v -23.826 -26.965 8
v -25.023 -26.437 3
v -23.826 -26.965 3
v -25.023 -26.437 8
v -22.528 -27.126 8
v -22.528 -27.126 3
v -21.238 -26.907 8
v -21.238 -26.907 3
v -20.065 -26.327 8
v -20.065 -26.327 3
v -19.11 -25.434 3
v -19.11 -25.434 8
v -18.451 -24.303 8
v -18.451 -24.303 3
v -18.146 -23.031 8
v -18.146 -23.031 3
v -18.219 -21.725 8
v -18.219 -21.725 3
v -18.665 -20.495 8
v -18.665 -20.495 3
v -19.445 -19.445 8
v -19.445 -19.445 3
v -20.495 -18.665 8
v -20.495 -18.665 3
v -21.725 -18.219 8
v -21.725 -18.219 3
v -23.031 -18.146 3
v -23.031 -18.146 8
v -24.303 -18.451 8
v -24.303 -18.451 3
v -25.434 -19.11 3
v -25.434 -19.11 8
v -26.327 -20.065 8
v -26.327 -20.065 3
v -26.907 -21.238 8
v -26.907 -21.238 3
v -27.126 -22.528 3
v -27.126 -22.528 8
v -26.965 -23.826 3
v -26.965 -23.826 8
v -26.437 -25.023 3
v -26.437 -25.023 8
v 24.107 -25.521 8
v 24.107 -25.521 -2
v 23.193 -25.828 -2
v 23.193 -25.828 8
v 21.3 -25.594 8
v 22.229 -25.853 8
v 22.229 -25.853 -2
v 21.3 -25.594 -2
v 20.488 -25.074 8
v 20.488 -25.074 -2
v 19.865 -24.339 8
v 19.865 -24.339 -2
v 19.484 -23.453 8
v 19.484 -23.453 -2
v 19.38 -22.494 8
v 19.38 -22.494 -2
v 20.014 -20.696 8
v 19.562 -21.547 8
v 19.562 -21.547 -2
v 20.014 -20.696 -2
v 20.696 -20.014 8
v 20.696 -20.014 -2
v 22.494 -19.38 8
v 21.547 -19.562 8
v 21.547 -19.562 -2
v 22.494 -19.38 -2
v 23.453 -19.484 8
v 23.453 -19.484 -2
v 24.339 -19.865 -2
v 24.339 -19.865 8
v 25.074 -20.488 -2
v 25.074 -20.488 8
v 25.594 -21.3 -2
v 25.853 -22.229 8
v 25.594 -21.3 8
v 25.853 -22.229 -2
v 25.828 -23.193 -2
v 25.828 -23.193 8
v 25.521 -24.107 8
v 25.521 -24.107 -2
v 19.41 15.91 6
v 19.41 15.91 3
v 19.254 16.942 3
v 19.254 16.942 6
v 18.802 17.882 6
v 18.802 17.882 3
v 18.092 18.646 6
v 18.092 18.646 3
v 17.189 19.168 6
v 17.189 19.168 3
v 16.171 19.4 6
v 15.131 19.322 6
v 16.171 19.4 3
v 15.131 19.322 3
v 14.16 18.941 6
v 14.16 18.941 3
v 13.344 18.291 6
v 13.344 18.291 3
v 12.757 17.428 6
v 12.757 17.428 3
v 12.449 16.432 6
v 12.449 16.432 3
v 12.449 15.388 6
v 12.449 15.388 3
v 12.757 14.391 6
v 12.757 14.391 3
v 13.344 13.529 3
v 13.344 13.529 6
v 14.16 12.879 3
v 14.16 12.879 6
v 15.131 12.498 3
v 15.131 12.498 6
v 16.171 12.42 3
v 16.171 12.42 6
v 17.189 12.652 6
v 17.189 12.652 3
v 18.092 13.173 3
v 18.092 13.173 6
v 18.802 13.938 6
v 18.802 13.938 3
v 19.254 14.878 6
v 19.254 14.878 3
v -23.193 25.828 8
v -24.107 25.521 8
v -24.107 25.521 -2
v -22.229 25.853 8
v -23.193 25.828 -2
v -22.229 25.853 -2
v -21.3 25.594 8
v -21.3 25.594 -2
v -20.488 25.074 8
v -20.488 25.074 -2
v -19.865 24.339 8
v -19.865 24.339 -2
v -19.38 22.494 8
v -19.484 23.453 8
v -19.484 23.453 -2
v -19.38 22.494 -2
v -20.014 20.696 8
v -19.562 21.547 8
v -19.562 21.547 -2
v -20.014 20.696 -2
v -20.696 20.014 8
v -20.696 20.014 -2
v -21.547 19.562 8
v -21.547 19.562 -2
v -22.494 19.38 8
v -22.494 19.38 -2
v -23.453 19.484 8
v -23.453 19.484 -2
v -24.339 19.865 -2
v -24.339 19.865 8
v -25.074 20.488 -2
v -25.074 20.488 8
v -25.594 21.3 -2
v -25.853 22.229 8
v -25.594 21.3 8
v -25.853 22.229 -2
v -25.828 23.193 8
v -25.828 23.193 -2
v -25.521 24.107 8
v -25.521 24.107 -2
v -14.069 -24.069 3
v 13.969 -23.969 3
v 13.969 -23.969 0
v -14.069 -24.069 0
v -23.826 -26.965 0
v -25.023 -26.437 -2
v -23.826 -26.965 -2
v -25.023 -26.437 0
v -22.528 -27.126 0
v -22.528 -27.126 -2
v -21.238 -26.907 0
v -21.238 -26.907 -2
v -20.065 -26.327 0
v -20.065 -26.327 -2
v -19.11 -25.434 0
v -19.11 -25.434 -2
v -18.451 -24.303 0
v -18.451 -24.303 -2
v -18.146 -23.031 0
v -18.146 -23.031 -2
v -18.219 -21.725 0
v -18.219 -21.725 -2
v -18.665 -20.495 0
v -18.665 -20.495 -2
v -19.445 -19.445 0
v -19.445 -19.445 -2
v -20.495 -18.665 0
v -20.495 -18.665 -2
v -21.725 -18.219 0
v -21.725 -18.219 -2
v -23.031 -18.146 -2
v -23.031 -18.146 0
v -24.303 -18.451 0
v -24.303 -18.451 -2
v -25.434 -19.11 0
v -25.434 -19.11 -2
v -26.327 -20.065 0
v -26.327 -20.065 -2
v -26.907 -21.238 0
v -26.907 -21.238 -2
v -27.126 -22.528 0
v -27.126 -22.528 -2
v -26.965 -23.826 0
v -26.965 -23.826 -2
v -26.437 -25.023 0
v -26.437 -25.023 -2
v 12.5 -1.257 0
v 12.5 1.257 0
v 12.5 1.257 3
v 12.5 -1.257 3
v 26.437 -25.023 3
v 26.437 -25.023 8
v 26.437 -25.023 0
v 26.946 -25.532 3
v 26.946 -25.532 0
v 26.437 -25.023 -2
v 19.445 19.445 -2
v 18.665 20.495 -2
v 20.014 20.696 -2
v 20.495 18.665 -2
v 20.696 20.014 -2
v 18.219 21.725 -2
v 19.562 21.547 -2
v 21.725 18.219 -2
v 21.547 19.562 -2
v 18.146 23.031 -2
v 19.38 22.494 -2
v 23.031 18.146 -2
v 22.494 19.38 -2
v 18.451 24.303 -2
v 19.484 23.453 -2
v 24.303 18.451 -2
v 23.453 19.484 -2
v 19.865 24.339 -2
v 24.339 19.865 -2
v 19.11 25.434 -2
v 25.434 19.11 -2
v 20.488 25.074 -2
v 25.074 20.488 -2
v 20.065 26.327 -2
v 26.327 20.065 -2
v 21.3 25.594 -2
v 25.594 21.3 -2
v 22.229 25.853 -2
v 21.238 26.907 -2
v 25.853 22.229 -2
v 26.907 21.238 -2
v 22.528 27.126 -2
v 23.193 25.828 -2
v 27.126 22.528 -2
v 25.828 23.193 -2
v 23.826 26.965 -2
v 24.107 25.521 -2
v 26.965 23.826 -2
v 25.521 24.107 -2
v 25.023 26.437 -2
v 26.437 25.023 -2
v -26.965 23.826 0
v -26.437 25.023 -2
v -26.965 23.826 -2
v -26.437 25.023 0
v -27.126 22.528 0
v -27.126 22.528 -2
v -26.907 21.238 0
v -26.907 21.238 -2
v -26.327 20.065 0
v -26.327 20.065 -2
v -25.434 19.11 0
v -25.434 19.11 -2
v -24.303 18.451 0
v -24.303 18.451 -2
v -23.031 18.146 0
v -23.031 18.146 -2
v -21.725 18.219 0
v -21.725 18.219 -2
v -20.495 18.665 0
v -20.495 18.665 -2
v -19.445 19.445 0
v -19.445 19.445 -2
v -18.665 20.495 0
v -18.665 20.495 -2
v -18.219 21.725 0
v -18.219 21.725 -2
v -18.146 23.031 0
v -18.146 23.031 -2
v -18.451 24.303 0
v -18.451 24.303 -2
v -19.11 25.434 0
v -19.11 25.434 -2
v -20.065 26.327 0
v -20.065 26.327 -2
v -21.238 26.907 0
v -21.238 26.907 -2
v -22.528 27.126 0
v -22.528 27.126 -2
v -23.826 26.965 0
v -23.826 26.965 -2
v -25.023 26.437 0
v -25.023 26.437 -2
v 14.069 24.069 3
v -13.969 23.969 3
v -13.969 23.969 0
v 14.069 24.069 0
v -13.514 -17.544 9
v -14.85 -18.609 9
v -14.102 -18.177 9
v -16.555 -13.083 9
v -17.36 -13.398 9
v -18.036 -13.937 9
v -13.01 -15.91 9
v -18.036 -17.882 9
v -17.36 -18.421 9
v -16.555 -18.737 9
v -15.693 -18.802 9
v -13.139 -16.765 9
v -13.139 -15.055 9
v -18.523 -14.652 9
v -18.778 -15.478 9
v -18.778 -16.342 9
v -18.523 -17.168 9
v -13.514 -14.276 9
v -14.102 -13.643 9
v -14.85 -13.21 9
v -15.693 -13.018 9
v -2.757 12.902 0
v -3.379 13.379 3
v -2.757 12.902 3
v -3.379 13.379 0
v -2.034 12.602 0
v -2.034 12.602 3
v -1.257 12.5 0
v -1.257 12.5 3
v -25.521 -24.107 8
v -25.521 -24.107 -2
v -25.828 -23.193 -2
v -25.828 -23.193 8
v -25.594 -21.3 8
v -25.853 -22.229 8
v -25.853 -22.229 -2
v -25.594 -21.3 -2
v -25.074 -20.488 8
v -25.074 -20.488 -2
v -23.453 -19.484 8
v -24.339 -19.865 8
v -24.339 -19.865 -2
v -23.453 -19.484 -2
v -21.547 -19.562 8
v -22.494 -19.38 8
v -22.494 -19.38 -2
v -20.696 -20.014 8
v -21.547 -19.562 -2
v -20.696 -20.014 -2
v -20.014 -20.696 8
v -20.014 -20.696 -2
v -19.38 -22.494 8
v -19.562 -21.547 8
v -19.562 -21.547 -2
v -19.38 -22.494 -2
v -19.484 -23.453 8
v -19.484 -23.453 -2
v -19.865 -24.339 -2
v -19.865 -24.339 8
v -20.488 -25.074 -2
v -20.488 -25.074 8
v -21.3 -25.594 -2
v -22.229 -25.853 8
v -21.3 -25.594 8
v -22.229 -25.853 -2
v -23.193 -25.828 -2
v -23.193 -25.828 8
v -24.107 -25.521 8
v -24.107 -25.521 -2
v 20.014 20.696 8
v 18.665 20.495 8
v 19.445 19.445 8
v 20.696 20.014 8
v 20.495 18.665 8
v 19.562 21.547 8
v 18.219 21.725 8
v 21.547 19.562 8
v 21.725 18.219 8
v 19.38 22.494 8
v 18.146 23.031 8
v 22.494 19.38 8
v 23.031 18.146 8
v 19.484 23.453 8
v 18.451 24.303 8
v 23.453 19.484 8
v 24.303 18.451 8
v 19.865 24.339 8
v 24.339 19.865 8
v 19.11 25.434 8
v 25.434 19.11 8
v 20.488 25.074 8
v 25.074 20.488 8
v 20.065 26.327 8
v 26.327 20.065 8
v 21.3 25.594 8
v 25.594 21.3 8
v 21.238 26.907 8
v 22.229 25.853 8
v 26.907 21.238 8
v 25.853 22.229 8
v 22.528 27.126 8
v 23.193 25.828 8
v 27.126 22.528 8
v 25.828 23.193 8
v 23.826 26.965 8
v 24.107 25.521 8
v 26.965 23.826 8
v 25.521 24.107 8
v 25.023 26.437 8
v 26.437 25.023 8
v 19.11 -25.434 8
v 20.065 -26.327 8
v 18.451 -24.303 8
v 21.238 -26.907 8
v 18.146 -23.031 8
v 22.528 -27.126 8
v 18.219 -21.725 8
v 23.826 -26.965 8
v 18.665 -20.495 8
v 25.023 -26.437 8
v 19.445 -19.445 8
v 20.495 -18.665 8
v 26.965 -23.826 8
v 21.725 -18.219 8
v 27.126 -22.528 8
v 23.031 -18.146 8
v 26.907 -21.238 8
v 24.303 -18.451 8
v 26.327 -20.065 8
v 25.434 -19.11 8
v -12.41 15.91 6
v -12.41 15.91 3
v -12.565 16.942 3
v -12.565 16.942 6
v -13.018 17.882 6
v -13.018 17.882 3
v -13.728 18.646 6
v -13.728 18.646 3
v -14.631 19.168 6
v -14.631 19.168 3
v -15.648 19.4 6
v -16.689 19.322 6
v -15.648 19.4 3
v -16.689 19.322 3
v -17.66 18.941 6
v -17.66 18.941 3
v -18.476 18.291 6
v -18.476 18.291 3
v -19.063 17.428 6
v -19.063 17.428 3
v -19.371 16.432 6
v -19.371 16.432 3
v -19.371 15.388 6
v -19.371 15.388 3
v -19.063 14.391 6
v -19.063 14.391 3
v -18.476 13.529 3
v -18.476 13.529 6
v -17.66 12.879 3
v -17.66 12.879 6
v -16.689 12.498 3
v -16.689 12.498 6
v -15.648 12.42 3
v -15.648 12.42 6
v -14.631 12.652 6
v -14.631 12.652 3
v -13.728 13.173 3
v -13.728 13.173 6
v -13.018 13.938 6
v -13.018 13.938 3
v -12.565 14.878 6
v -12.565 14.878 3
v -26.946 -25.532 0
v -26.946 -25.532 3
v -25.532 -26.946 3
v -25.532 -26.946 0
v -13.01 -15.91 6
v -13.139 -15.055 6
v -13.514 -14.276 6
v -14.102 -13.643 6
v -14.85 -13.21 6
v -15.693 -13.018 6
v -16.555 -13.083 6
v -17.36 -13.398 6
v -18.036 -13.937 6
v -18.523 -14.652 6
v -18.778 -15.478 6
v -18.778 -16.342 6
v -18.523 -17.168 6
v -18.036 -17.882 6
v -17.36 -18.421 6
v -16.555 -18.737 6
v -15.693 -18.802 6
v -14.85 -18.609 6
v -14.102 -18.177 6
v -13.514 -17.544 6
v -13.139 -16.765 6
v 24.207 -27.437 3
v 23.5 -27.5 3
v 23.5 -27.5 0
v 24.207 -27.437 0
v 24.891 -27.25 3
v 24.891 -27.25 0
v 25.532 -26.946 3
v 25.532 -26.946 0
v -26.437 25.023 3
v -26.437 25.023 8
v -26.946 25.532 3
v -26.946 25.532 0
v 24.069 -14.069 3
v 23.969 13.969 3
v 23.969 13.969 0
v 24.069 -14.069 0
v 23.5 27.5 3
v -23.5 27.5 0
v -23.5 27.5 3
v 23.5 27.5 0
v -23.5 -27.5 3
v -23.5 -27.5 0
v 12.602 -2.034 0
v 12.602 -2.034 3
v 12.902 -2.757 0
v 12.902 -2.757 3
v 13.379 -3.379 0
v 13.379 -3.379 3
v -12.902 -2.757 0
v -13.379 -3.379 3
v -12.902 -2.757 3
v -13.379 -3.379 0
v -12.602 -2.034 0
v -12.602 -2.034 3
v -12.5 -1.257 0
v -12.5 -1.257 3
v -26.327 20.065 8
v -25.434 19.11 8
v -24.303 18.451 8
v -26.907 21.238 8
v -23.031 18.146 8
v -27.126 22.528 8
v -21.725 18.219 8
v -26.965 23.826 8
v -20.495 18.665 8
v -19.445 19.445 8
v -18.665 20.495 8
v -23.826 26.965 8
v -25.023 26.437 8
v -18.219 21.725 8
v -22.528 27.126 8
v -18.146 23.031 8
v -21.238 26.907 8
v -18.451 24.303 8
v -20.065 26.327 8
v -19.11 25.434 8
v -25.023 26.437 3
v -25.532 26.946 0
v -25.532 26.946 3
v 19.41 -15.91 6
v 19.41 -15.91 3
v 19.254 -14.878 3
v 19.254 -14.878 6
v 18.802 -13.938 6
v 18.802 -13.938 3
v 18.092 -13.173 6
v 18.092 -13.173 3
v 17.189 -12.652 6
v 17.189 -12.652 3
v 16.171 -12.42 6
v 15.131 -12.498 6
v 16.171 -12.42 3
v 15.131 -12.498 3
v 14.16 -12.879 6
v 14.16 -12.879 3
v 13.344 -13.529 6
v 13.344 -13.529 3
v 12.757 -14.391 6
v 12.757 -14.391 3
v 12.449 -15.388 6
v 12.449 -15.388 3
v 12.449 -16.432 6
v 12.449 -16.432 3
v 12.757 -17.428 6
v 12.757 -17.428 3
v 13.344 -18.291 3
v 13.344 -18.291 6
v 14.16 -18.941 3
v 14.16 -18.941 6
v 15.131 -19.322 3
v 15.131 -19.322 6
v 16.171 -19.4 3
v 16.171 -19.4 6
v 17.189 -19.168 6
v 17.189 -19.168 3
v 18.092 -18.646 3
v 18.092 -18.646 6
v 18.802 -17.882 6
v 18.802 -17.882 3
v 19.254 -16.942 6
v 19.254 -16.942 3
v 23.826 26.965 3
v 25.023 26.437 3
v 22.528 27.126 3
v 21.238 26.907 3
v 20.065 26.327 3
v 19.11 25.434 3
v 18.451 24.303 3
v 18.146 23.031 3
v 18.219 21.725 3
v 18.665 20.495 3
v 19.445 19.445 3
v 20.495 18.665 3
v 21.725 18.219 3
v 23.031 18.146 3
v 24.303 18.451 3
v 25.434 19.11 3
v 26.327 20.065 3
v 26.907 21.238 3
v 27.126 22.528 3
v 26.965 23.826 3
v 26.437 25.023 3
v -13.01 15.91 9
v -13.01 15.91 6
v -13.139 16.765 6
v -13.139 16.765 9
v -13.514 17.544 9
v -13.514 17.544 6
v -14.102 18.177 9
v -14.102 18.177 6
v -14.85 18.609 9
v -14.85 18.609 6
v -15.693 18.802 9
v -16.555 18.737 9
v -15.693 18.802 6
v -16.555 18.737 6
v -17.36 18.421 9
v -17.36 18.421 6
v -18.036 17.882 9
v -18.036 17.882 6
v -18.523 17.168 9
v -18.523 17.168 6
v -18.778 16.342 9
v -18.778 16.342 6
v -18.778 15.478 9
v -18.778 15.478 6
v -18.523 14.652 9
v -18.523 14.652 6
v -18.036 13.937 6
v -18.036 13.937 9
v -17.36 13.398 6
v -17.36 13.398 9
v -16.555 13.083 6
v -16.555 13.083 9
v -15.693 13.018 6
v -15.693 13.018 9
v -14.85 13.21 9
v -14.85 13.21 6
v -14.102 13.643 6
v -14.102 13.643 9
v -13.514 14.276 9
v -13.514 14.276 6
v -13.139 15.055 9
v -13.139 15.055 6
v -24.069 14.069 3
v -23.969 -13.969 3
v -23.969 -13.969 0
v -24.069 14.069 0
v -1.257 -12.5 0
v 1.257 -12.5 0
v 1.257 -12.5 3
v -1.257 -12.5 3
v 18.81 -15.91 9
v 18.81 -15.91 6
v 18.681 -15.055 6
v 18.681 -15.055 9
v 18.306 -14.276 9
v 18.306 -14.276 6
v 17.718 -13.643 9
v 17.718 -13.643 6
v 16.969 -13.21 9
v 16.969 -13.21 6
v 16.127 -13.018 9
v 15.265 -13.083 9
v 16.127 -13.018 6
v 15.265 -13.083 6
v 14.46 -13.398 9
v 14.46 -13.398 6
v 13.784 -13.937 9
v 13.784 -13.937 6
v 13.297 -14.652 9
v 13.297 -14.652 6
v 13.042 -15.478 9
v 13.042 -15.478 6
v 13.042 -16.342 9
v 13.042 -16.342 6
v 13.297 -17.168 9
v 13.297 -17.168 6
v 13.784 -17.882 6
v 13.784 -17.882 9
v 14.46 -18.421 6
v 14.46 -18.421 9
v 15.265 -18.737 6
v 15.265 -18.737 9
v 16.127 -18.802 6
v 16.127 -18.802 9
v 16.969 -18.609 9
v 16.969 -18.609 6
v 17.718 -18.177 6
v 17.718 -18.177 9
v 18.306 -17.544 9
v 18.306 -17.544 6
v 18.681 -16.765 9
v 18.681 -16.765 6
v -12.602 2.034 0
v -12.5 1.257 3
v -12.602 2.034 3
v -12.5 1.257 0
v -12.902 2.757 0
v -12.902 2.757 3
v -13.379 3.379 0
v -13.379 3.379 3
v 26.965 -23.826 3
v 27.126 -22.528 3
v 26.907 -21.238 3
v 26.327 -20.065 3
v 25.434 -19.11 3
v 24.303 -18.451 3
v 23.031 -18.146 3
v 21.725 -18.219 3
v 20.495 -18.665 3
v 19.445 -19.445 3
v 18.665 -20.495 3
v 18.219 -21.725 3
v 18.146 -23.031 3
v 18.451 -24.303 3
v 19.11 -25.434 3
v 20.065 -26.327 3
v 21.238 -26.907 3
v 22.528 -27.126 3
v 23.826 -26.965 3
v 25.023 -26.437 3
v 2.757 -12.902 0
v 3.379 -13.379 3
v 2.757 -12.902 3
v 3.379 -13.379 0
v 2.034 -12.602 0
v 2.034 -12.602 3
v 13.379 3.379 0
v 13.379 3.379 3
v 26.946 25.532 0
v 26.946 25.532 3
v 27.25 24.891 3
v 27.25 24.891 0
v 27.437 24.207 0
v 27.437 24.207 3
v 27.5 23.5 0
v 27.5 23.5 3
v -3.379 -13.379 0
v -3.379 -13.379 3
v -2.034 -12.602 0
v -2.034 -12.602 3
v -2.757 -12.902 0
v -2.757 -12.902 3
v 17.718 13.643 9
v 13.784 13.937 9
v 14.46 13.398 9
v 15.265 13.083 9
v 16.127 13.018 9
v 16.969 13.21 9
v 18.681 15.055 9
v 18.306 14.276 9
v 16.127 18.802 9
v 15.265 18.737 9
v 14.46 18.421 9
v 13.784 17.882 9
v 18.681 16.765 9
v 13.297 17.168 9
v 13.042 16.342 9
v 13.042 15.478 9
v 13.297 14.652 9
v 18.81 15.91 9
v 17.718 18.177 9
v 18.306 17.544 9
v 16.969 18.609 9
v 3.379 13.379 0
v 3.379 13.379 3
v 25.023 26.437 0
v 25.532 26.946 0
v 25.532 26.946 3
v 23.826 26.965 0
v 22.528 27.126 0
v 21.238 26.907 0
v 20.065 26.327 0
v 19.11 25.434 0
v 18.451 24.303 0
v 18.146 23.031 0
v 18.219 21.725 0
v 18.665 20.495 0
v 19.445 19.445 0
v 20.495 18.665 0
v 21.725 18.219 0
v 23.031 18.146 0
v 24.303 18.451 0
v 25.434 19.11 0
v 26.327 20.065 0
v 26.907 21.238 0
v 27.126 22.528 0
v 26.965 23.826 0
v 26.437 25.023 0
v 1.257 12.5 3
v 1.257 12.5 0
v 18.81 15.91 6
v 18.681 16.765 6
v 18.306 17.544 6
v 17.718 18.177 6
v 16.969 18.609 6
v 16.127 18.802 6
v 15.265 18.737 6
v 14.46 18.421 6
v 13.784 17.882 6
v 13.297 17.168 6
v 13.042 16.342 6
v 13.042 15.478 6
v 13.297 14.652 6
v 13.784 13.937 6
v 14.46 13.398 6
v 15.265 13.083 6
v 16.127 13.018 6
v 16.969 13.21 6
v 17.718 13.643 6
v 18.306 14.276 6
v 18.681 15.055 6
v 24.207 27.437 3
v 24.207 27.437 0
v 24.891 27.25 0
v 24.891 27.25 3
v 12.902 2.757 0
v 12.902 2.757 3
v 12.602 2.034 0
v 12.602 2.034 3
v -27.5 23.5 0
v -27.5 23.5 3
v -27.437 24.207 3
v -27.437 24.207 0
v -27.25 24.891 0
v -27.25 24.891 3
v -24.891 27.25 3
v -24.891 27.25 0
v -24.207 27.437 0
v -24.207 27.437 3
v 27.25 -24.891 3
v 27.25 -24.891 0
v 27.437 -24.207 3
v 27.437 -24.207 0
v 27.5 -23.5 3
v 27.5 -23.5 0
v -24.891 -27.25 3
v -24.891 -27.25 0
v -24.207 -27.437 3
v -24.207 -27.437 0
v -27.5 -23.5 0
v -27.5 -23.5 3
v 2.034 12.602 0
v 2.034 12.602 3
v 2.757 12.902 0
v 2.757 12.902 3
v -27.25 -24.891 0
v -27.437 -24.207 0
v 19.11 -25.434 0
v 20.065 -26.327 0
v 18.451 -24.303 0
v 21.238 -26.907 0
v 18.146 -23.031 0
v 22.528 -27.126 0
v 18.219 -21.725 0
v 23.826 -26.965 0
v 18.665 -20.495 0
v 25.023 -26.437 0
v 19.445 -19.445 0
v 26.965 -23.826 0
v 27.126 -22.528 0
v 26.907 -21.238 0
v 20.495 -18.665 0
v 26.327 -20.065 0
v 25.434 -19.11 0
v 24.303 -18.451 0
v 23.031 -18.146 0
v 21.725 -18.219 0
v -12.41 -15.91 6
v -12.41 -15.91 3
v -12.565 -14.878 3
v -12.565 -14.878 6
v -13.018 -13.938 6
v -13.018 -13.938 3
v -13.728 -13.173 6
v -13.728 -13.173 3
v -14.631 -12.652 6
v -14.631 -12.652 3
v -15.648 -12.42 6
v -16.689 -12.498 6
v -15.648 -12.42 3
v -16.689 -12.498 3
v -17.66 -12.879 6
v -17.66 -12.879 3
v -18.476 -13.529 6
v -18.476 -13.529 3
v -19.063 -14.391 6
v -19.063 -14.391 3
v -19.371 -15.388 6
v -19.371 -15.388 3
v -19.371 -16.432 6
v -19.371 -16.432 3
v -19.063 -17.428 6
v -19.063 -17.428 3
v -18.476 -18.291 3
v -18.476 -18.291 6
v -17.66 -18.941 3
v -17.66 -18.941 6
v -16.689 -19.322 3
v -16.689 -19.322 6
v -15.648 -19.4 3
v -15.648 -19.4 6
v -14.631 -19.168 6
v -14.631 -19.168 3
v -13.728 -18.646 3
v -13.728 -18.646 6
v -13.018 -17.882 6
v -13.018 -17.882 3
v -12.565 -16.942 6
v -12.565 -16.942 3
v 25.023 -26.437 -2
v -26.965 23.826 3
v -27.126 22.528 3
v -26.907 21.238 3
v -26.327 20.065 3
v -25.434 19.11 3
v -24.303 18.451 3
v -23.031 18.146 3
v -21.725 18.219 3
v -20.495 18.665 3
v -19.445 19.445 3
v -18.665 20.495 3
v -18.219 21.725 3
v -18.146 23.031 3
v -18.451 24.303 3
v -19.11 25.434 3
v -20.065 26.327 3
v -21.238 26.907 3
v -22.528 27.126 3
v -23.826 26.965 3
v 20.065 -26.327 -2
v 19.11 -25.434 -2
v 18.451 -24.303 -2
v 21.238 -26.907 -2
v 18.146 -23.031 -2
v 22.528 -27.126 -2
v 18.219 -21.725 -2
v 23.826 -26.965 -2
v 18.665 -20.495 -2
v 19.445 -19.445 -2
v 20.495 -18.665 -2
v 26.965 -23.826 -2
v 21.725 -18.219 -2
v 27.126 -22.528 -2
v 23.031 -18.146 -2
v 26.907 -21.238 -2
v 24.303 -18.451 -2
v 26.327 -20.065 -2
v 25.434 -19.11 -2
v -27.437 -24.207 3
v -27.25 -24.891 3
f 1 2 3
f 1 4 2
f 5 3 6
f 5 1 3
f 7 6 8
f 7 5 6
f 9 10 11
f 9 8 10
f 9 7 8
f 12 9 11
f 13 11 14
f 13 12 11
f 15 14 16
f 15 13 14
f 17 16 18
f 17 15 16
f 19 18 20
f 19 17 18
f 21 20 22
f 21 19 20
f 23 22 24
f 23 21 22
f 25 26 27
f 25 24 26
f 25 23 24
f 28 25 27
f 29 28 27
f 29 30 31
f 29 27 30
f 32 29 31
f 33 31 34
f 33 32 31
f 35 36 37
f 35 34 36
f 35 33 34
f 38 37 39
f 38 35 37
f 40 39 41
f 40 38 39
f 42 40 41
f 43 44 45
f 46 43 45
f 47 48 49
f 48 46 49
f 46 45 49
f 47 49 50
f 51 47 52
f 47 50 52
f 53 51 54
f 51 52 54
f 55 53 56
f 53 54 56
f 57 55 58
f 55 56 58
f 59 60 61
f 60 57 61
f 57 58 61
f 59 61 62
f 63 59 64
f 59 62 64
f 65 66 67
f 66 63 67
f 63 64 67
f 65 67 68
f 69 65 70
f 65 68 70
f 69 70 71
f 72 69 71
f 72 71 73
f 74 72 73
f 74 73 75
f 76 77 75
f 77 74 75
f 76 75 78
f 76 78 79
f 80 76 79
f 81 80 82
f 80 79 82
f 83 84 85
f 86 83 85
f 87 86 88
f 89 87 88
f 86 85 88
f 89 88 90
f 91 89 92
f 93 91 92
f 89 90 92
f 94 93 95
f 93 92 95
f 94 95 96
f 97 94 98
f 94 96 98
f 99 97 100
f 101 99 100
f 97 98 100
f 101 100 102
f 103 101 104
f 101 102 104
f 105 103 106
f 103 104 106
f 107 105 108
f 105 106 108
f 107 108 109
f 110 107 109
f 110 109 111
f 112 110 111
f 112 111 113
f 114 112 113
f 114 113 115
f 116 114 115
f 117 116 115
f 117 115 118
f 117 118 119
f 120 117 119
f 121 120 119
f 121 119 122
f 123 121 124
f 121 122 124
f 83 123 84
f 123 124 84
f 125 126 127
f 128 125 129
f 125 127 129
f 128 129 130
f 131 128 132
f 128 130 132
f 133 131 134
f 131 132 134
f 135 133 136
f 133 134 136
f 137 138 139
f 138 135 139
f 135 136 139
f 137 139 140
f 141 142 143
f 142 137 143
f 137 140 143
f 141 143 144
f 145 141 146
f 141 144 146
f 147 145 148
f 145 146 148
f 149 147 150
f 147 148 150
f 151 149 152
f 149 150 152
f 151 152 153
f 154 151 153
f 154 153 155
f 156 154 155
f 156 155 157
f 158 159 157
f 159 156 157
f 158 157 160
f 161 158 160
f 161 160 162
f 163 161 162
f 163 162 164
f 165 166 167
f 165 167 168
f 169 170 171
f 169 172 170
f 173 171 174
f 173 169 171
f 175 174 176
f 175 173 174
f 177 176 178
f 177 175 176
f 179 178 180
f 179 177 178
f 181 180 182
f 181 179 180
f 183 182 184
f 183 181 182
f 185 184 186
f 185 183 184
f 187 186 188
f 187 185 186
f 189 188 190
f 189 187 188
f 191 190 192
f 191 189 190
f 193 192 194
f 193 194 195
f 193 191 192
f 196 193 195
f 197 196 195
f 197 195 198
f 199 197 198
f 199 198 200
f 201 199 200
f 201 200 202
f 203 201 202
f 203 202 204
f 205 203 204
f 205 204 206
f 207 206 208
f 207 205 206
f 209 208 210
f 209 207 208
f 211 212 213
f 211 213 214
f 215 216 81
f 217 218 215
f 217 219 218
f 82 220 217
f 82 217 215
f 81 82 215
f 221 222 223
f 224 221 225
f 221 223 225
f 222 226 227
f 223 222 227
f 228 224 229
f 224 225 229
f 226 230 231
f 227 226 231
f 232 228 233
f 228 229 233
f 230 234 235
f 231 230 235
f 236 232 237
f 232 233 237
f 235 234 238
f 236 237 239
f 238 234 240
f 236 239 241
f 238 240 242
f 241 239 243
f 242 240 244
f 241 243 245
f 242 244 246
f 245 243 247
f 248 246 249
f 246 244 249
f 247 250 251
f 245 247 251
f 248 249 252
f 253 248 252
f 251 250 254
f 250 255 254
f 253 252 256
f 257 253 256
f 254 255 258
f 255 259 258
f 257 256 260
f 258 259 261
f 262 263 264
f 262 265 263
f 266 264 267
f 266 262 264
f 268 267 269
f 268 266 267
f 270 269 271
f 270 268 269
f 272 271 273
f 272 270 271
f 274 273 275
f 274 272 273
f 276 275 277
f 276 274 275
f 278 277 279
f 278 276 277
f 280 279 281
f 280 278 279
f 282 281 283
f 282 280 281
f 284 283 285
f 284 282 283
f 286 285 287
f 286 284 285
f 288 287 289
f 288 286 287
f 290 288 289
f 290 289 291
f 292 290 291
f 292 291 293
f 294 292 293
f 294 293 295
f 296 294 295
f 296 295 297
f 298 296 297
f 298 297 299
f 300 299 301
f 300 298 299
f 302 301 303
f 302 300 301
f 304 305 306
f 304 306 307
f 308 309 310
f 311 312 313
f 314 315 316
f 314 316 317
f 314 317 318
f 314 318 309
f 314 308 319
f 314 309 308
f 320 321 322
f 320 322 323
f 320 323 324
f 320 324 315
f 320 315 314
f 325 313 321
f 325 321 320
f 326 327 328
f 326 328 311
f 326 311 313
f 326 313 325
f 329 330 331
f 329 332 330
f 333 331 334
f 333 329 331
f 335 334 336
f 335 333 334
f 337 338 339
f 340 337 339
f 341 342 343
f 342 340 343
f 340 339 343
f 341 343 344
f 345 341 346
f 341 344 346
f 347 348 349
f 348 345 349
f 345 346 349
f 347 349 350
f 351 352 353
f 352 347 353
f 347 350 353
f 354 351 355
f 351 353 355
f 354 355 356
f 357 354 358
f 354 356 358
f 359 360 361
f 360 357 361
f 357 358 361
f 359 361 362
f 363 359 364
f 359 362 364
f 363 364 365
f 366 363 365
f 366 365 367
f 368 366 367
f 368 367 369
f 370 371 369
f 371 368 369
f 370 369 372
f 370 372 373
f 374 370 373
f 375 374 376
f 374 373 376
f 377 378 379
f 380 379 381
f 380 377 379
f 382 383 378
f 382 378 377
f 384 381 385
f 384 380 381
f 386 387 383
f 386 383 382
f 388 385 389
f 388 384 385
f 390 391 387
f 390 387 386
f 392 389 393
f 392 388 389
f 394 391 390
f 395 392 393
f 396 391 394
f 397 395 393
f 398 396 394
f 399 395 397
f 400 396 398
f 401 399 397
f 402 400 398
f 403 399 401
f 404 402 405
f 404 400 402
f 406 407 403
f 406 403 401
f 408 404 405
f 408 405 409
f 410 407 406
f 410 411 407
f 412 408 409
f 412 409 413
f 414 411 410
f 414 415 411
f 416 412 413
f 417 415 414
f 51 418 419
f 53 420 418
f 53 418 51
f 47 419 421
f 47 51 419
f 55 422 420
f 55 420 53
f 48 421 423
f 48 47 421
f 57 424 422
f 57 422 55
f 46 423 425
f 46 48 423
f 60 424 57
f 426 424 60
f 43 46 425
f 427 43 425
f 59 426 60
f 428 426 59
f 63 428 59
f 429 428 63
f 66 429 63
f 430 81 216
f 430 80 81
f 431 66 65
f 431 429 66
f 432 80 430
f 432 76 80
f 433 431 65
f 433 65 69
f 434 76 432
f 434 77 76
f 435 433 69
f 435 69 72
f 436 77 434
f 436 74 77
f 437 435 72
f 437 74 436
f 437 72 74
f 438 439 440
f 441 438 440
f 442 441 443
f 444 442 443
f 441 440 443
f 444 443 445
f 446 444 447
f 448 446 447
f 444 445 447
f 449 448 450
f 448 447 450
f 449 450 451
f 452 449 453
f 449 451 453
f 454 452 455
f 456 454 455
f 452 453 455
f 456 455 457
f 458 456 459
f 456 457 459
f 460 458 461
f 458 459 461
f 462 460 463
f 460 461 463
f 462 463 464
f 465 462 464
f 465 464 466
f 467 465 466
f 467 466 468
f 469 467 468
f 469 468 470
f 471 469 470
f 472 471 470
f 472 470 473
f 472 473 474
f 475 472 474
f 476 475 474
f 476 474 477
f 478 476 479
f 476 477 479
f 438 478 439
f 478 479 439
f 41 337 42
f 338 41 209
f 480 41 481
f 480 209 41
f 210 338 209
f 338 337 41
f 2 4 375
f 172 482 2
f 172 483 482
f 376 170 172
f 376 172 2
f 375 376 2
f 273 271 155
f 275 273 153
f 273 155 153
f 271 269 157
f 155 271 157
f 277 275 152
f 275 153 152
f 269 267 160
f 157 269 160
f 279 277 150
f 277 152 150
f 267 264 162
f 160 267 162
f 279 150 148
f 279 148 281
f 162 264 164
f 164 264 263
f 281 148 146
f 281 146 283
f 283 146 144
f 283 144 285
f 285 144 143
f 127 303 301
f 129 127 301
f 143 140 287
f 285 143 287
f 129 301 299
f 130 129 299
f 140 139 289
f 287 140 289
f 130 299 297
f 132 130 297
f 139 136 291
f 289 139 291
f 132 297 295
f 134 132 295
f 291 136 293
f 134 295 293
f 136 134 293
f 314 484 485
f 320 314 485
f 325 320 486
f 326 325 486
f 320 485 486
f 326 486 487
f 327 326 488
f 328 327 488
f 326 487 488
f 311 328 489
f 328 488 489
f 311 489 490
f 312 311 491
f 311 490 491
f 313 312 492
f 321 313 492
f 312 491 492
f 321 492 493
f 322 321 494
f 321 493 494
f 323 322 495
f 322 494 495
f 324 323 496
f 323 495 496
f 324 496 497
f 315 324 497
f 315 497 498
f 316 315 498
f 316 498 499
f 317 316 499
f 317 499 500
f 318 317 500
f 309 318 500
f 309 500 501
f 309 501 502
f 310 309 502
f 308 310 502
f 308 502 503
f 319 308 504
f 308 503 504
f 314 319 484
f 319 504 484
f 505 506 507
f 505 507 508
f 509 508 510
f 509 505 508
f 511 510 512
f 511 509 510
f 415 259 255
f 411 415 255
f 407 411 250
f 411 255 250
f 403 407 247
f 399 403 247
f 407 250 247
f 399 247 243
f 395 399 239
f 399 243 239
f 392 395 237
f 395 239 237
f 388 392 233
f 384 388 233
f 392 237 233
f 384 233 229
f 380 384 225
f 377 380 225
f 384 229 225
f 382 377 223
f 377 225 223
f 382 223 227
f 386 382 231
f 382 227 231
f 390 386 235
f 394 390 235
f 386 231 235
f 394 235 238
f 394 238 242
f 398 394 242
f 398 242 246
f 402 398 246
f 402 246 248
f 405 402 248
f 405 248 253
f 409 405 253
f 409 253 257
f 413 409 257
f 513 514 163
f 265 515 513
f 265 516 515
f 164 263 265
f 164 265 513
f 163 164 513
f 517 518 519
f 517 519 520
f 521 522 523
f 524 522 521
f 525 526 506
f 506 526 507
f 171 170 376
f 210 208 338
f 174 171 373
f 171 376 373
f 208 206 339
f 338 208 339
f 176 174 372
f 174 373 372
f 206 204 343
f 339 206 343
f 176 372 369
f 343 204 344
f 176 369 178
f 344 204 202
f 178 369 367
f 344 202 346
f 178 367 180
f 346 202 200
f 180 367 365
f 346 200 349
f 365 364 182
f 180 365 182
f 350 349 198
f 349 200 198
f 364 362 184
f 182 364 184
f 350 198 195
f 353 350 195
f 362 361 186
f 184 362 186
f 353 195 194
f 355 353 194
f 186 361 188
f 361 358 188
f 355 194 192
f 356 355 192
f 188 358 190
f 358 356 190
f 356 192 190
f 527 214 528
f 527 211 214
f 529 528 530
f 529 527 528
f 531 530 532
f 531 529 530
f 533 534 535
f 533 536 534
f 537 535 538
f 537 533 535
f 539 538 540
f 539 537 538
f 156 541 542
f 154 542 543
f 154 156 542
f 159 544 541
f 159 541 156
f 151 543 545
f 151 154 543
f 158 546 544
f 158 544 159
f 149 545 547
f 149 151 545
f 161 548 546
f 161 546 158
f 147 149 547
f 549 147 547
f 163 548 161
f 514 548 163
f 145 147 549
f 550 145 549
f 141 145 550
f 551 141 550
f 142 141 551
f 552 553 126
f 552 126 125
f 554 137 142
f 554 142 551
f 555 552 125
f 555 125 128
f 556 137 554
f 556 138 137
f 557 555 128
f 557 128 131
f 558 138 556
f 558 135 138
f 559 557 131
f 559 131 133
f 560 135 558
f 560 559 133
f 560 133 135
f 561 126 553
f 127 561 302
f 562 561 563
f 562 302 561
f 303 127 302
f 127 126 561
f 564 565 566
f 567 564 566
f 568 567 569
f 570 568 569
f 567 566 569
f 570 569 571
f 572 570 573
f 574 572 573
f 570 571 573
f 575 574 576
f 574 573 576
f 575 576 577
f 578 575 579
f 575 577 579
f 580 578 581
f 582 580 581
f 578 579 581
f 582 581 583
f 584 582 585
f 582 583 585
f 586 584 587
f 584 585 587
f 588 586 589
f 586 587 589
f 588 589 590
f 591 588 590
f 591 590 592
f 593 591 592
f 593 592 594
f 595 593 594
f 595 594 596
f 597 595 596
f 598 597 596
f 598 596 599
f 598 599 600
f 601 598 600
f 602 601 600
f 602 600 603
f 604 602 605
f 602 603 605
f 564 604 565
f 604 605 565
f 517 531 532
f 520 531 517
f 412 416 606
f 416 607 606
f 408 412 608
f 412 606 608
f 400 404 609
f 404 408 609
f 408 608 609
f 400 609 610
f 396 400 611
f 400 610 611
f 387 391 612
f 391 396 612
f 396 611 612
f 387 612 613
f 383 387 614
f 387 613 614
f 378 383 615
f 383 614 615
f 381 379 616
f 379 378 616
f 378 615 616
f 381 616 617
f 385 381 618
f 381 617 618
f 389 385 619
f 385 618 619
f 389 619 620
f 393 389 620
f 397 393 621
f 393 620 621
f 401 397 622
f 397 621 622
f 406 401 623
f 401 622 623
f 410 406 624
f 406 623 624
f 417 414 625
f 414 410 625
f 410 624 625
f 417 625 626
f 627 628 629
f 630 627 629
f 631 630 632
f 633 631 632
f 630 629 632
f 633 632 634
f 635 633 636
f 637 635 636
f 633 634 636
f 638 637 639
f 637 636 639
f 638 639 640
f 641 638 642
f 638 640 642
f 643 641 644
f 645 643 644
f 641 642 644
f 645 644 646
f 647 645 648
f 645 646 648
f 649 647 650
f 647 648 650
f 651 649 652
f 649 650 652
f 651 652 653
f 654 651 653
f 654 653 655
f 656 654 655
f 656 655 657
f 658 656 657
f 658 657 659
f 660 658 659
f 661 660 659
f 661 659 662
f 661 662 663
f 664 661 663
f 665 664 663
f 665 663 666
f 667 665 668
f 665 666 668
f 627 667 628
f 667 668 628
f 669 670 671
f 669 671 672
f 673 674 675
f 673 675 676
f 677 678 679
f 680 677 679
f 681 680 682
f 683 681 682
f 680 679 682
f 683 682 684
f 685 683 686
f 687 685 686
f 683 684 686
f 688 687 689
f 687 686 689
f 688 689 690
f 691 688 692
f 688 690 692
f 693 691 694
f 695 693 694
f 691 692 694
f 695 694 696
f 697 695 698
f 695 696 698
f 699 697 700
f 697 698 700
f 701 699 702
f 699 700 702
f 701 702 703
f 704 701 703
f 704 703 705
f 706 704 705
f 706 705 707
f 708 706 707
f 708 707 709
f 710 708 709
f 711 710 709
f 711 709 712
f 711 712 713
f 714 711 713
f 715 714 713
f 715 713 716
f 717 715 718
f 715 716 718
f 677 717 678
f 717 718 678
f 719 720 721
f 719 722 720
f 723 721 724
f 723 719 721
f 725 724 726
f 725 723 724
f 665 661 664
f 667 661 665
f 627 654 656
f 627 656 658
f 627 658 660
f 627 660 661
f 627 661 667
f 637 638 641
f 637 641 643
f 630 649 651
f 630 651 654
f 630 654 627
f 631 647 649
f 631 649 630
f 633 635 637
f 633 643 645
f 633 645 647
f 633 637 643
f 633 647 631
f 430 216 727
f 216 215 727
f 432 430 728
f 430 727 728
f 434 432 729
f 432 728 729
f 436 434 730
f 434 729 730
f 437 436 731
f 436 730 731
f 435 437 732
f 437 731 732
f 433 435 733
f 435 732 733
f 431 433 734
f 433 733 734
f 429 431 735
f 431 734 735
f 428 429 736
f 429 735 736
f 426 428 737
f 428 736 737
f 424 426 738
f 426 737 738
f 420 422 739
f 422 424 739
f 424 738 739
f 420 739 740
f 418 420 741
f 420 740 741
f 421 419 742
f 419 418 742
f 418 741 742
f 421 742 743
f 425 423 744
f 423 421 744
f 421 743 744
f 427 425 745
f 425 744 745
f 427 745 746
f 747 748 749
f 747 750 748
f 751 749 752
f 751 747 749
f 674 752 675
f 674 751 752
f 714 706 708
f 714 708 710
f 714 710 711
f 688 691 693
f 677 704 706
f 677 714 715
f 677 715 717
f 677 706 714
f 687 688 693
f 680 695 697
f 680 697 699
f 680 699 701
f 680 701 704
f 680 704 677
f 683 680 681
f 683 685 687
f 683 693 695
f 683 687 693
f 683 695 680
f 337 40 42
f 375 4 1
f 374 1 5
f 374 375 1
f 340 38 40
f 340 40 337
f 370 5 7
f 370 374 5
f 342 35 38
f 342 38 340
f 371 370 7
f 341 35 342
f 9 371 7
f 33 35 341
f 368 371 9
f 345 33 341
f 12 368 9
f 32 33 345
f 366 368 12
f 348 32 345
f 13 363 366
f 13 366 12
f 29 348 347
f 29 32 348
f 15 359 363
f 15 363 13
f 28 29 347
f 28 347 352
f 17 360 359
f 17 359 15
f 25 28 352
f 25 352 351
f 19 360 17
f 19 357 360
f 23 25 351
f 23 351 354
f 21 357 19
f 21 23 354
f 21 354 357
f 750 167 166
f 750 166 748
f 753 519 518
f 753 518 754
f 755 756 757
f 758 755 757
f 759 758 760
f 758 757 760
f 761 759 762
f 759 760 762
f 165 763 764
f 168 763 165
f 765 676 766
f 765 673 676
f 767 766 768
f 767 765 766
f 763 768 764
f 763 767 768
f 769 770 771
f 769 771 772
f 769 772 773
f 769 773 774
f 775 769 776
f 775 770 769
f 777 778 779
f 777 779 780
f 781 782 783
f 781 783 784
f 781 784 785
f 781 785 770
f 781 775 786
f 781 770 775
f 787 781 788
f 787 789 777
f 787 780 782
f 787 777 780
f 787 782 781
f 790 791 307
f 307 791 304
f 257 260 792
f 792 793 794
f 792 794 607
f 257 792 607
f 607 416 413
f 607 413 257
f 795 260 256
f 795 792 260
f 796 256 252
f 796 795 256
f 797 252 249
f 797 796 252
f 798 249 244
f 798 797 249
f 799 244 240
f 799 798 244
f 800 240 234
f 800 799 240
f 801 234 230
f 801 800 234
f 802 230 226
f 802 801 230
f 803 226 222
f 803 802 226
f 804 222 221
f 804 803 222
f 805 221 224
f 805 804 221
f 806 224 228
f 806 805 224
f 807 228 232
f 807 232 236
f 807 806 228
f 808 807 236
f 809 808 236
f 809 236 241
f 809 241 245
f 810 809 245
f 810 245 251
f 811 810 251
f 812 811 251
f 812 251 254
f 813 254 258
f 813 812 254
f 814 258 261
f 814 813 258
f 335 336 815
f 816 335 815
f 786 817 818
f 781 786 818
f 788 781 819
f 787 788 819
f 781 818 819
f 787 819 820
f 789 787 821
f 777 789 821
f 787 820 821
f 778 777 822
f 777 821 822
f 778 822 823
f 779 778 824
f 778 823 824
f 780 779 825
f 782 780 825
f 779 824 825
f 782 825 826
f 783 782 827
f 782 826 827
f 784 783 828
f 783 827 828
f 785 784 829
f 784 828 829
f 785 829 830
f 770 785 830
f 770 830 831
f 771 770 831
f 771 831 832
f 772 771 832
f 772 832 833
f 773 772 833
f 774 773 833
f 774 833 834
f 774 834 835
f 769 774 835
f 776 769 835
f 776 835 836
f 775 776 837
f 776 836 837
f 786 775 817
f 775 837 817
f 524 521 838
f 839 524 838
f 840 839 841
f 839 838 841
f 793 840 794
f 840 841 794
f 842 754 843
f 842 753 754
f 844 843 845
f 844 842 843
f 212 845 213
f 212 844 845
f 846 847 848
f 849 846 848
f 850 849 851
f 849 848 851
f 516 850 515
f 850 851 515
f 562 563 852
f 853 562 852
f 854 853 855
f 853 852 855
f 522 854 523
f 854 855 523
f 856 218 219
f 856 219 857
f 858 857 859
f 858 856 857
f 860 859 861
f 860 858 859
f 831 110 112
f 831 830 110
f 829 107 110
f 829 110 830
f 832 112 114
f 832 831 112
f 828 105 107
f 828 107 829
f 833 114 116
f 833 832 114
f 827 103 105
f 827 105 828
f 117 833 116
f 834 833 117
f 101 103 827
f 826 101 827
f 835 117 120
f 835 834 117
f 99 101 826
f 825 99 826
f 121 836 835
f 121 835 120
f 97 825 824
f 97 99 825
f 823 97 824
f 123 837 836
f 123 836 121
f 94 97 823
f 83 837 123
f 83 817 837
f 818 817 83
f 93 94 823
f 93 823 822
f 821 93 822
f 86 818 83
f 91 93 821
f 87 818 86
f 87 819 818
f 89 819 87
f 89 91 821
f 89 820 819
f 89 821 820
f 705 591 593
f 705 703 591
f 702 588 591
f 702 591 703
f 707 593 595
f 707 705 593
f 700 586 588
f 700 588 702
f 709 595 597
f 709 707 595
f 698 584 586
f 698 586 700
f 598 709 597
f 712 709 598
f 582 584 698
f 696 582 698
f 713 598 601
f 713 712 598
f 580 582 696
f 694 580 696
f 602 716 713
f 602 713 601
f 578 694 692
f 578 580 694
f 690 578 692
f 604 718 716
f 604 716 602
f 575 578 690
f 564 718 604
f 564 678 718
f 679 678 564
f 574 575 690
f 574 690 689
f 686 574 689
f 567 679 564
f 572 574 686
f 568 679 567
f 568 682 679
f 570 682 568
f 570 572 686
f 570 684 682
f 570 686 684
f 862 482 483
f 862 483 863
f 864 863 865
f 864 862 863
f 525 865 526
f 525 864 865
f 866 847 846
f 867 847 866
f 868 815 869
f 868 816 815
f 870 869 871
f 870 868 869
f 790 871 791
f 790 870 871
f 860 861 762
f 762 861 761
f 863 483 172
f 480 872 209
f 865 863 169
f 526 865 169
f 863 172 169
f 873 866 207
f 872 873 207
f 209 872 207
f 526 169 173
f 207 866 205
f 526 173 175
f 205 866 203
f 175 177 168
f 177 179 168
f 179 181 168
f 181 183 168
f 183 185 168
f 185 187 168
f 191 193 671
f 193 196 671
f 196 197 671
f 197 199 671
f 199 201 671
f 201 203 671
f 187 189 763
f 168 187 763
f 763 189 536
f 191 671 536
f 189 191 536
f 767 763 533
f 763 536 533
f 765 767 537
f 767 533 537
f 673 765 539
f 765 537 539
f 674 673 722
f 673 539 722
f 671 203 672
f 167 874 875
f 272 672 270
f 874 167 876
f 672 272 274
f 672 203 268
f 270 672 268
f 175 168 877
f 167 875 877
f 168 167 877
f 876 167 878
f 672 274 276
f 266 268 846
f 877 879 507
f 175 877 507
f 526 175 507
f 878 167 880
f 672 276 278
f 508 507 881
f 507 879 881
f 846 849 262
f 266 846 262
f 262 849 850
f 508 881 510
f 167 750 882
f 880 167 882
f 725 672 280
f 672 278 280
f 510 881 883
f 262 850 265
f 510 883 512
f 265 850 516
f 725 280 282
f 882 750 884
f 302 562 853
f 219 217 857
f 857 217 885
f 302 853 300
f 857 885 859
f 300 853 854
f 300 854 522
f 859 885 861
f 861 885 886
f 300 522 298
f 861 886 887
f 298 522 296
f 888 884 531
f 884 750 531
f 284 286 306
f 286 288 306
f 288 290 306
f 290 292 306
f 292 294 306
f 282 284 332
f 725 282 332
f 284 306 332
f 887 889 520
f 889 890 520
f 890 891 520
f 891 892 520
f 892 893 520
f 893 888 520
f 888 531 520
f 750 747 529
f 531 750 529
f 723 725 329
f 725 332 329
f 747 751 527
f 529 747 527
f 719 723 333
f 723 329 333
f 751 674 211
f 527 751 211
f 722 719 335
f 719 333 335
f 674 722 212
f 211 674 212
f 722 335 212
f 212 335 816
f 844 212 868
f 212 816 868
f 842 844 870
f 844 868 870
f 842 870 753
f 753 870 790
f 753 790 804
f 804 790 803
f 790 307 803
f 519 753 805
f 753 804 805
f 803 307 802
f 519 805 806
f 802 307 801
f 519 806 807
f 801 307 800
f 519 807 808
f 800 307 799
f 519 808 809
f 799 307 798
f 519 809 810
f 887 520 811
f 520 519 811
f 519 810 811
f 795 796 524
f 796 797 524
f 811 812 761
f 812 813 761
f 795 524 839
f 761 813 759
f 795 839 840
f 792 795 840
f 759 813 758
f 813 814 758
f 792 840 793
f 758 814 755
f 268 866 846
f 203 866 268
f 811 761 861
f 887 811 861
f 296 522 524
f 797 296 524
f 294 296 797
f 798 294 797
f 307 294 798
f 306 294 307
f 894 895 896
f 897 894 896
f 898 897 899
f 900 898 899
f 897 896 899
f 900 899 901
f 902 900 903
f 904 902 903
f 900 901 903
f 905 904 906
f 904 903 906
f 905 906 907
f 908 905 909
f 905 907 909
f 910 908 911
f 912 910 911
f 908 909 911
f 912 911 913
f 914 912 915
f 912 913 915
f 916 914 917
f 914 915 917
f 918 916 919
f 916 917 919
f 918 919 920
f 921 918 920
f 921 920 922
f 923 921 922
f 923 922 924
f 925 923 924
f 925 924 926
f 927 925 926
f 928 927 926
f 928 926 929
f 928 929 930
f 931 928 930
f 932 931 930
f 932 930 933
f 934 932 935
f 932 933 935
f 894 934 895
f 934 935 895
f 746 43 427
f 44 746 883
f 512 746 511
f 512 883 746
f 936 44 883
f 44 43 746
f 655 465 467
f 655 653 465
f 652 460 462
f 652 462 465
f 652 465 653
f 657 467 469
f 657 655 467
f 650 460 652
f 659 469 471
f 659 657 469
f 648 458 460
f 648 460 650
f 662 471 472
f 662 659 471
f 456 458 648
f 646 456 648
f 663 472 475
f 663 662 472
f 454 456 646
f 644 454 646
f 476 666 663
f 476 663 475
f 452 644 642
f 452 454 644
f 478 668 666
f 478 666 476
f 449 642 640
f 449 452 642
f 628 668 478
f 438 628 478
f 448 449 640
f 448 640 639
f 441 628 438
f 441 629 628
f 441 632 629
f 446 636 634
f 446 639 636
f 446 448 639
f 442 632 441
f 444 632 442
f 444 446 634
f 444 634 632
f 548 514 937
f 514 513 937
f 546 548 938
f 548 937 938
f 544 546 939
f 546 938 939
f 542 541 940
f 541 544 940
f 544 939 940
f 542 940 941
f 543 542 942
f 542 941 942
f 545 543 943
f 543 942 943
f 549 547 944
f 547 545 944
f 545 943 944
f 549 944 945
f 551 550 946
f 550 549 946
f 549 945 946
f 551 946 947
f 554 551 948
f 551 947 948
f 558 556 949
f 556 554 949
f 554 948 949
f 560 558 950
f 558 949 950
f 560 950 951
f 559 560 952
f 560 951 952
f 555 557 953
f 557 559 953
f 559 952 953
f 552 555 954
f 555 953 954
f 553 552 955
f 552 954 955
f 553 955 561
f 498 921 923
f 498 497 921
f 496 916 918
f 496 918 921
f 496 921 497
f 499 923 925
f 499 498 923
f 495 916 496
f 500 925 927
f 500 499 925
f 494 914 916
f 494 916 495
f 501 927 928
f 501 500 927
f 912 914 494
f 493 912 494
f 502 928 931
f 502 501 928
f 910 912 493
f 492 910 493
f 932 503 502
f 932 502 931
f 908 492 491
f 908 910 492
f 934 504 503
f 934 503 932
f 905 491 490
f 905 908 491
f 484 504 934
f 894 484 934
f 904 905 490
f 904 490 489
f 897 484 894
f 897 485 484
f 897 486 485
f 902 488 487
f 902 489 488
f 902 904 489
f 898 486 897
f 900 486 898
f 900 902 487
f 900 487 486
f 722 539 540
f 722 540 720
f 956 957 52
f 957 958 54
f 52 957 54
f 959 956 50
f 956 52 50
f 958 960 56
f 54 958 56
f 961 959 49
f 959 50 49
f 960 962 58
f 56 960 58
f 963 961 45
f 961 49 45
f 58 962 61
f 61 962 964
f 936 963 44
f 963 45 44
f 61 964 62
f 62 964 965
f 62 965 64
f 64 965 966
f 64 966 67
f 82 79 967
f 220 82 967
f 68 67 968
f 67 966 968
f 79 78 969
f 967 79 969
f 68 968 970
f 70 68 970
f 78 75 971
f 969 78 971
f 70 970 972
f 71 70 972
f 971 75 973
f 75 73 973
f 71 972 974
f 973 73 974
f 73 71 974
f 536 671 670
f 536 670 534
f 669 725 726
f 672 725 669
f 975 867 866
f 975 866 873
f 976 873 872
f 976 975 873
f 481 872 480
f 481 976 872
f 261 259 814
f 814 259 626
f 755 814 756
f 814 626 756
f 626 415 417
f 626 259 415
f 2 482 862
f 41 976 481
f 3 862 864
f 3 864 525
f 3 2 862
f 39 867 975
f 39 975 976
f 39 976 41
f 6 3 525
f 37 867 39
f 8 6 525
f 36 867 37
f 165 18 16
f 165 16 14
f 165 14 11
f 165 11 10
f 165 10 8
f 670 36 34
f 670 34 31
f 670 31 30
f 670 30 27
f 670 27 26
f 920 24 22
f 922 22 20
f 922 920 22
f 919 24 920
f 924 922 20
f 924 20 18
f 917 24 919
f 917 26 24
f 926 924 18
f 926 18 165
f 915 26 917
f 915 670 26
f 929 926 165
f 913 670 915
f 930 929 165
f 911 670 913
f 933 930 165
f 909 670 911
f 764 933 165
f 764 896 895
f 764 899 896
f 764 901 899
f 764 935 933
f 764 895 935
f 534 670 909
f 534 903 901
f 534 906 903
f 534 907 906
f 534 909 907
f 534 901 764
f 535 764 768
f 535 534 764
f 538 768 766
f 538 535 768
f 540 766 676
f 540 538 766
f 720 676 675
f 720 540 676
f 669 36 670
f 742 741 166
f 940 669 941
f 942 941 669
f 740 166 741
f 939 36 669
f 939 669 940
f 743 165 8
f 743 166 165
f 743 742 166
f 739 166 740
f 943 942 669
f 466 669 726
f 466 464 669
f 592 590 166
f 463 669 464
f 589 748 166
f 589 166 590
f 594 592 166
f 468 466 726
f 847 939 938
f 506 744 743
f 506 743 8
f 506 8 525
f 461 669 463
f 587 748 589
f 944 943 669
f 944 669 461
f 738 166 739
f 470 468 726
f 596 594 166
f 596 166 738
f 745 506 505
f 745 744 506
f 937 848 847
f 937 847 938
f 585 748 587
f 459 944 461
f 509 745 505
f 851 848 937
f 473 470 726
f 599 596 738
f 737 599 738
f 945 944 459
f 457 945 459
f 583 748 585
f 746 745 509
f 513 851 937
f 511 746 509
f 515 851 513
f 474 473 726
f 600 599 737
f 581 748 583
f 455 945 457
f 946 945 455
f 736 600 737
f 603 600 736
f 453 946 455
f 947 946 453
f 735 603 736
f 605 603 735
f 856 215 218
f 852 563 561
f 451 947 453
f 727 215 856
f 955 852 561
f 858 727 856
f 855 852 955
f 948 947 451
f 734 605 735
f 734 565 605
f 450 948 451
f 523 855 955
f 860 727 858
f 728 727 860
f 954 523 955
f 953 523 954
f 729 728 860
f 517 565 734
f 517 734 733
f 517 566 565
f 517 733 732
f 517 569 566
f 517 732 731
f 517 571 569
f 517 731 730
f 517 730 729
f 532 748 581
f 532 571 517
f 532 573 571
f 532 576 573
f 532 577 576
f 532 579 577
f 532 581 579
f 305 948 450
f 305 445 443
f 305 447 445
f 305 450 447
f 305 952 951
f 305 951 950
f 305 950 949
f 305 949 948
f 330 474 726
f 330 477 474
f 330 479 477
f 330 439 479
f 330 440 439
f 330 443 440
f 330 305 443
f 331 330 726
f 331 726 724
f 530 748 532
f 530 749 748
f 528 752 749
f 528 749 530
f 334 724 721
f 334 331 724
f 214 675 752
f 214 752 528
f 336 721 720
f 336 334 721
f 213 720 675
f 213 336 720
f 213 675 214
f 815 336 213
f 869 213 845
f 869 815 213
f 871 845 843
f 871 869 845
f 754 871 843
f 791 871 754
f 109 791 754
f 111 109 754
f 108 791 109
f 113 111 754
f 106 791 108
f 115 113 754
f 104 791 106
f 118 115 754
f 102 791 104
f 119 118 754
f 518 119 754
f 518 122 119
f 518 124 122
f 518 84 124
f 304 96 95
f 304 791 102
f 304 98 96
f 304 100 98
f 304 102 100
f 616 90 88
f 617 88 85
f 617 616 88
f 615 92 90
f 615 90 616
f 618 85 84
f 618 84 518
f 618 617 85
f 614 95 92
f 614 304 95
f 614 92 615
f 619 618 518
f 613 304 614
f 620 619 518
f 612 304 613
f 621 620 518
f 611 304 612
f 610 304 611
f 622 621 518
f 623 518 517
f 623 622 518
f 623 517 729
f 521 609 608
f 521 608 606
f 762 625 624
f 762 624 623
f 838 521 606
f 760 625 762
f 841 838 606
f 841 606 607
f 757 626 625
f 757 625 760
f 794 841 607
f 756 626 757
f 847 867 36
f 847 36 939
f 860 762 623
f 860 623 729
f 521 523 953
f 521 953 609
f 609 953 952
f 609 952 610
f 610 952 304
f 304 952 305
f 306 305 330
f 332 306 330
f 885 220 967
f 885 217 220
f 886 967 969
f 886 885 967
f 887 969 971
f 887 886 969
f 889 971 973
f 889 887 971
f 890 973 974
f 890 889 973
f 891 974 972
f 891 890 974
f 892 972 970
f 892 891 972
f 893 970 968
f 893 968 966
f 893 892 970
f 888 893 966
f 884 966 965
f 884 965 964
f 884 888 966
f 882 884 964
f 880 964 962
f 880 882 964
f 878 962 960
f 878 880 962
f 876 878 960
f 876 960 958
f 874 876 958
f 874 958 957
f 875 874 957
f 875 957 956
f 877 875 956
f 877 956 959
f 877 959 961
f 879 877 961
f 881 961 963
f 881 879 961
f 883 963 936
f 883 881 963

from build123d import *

# Parameters (mm, degrees)
F0_W      = 55
F0_H      = 55
F1_DEPTH  = 3
F2_R      = 3.5
F3_DEPTH  = 3
F4_R      = 2.9
F5_DEPTH  = 3
F6_R      = 4.5
F7_DEPTH  = 5
F8_R      = 3.25
F9_DEPTH  = 25
F10_R     = 4
F12_DEPTH = 25
F13_R     = 3
F15_DEPTH = 3
F17_DEPTH = 20


with BuildPart() as f1:
    # F0 (on Top) → F1 (new body)
    with BuildSketch(Plane.XY):
        Rectangle(F0_W, F0_H)
    extrude(amount=F1_DEPTH)

    # F2 (on face) → F3 (join)
    with BuildSketch(Plane.XY.offset(3)):
        with Locations((-15.9099025767, 15.9099025767)):
            Circle(F2_R)
        with Locations((15.9099025767, 15.9099025767)):
            Circle(F2_R)
        with Locations((-15.9099025767, -15.9099025767)):
            Circle(F2_R)
        with Locations((15.9099025767, -15.9099025767)):
            Circle(F2_R)
    extrude(amount=F3_DEPTH)

    # F4 (on face) → F5 (join)
    with BuildSketch(Plane.XY.offset(6)):
        with Locations((-15.9099025767, 15.9099025767)):
            Circle(F4_R)
        with Locations((15.9099025767, 15.9099025767)):
            Circle(F4_R)
        with Locations((-15.9099025767, -15.9099025767)):
            Circle(F4_R)
        with Locations((15.9099025767, -15.9099025767)):
            Circle(F4_R)
    extrude(amount=F5_DEPTH)

    # F6 (on face) → F7 (join, symmetric)
    with BuildSketch(Plane.XY.offset(3)):
        with Locations((-22.627416998, 22.627416998)):
            Circle(F6_R)
        with Locations((22.627416998, 22.627416998)):
            Circle(F6_R)
        with Locations((22.627416998, -22.627416998)):
            Circle(F6_R)
        with Locations((-22.627416998, -22.627416998)):
            Circle(F6_R)
    extrude(amount=F7_DEPTH, both=True)

    # F8 (on face) → F9 (cut, symmetric)
    with BuildSketch(Plane(origin=(0, 0, -2), x_dir=(1, 0, 0), z_dir=(0, 0, -1))):
        with Locations((-22.627416998, 22.627416998)):
            Circle(F8_R)
        with Locations((22.627416998, 22.627416998)):
            Circle(F8_R)
        with Locations((-22.627416998, -22.627416998)):
            Circle(F8_R)
        with Locations((22.627416998, -22.627416998)):
            Circle(F8_R)
    extrude(amount=F9_DEPTH, both=True, mode=Mode.SUBTRACT)

    # F10
    f10_edges = [f1.edges().sort_by_distance(p)[0] for p in [
        (27.5, -27.5, 1.5),
        (-27.5, -27.5, 1.5),
        (-27.5, 27.5, 1.5),
        (27.5, 27.5, 1.5),
    ]]
    fillet(f10_edges, radius=F10_R)

    # F11 (on face) → F12 (cut, symmetric)
    with BuildSketch(Plane.XY.offset(3)):
        Polygon((-12.5, 2.5), (-27.5, 17.5), (-27.5, -17.5), (-12.5, -2.5), align=None)
        Polygon((-2.5, -12.5), (-17.5, -27.5), (17.5, -27.5), (2.5, -12.5), align=None)
        Polygon((12.5, -2.5), (27.5, -17.5), (27.5, 17.5), (12.5, 2.5), align=None)
        Polygon((2.5, 12.5), (17.5, 27.5), (-17.5, 27.5), (-2.5, 12.5), align=None)
    extrude(amount=F12_DEPTH, both=True, mode=Mode.SUBTRACT)

    # F13
    f13_edges = [f1.edges().sort_by_distance(p)[0] for p in [
        (27.5, 17.5, 1.5),
        (12.5, 2.5, 1.5),
        (27.5, -17.5, 1.5),
        (17.5, -27.5, 1.5),
        (-17.5, -27.5, 1.5),
        (-2.5, -12.5, 1.5),
        (2.5, -12.5, 1.5),
        (-27.5, -17.5, 1.5),
        (-12.5, -2.5, 1.5),
        (-12.5, 2.5, 1.5),
        (-27.5, 17.5, 1.5),
        (-17.5, 27.5, 1.5),
        (-2.5, 12.5, 1.5),
        (2.5, 12.5, 1.5),
        (17.5, 27.5, 1.5),
        (12.5, -2.5, 1.5),
    ]]
    fillet(f13_edges, radius=F13_R)

    # F14 (on face) → F15 (join)
    with BuildSketch(Plane.XY.offset(3)):
        with BuildLine():
            ThreePointArc((-26.6213203436, 16.6213203436), (-27.2716385975, 17.59459039), (-27.5, 18.7426406871))
            Line((-27.5, 18.7426406871), (-27.5, -18.7426406871))
            ThreePointArc((-27.5, -18.7426406871), (-27.2716385975, -17.59459039), (-26.6213203436, -16.6213203436))
            Line((-26.6213203436, -16.6213203436), (-23.9688763441, -13.9688763441))
            Line((-23.9688763441, -13.9688763441), (-24.0687389298, 14.0687389298))
            Line((-24.0687389298, 14.0687389298), (-26.6213203436, 16.6213203436))
        make_face()
        with BuildLine():
            Line((18.7426406871, 27.5), (-18.7426406871, 27.5))
            ThreePointArc((-18.7426406871, 27.5), (-17.59459039, 27.2716385975), (-16.6213203436, 26.6213203436))
            Line((-16.6213203436, 26.6213203436), (-13.9688763441, 23.9688763441))
            Line((-13.9688763441, 23.9688763441), (14.0687389298, 24.0687389298))
            Line((14.0687389298, 24.0687389298), (16.6213203436, 26.6213203436))
            ThreePointArc((16.6213203436, 26.6213203436), (17.59459039, 27.2716385975), (18.7426406871, 27.5))
        make_face()
        with BuildLine():
            Line((27.5, -18.7426406871), (27.5, 18.7426406871))
            ThreePointArc((27.5, 18.7426406871), (27.2716385975, 17.59459039), (26.6213203436, 16.6213203436))
            Line((26.6213203436, 16.6213203436), (23.9688763441, 13.9688763441))
            Line((23.9688763441, 13.9688763441), (24.0687389298, -14.0687389298))
            Line((24.0687389298, -14.0687389298), (26.6213203436, -16.6213203436))
            ThreePointArc((26.6213203436, -16.6213203436), (27.2716385975, -17.59459039), (27.5, -18.7426406871))
        make_face()
        with BuildLine():
            ThreePointArc((-16.6213203436, -26.6213203436), (-17.59459039, -27.2716385975), (-18.7426406871, -27.5))
            Line((-18.7426406871, -27.5), (18.7426406871, -27.5))
            ThreePointArc((18.7426406871, -27.5), (17.59459039, -27.2716385975), (16.6213203436, -26.6213203436))
            Line((16.6213203436, -26.6213203436), (13.9688763441, -23.9688763441))
            Line((13.9688763441, -23.9688763441), (-14.0687389298, -24.0687389298))
            Line((-14.0687389298, -24.0687389298), (-16.6213203436, -26.6213203436))
        make_face()
    extrude(amount=-F15_DEPTH)

    # F16 (on face) → F17 (cut, symmetric)
    with BuildSketch(Plane.XY.offset(3)):
        Polygon((-27.9307178569, 26.5165042945), (-25.1022907321, 23.6880771697), (-23.6880771697, 25.1022907321), (-26.5165042945, 27.9307178569), align=None)
        Polygon((-23.6880771697, -25.1022907321), (-25.1022907321, -23.6880771697), (-27.9307178569, -26.5165042945), (-26.5165042945, -27.9307178569), align=None)
        Polygon((25.1022907321, -23.6880771697), (23.6880771697, -25.1022907321), (26.5165042945, -27.9307178569), (27.9307178569, -26.5165042945), align=None)
        Polygon((23.6880771697, 25.1022907321), (25.1022907321, 23.6880771697), (27.9307178569, 26.5165042945), (26.5165042945, 27.9307178569), align=None)
    extrude(amount=F17_DEPTH, both=True, mode=Mode.SUBTRACT)


solid = f1.part
